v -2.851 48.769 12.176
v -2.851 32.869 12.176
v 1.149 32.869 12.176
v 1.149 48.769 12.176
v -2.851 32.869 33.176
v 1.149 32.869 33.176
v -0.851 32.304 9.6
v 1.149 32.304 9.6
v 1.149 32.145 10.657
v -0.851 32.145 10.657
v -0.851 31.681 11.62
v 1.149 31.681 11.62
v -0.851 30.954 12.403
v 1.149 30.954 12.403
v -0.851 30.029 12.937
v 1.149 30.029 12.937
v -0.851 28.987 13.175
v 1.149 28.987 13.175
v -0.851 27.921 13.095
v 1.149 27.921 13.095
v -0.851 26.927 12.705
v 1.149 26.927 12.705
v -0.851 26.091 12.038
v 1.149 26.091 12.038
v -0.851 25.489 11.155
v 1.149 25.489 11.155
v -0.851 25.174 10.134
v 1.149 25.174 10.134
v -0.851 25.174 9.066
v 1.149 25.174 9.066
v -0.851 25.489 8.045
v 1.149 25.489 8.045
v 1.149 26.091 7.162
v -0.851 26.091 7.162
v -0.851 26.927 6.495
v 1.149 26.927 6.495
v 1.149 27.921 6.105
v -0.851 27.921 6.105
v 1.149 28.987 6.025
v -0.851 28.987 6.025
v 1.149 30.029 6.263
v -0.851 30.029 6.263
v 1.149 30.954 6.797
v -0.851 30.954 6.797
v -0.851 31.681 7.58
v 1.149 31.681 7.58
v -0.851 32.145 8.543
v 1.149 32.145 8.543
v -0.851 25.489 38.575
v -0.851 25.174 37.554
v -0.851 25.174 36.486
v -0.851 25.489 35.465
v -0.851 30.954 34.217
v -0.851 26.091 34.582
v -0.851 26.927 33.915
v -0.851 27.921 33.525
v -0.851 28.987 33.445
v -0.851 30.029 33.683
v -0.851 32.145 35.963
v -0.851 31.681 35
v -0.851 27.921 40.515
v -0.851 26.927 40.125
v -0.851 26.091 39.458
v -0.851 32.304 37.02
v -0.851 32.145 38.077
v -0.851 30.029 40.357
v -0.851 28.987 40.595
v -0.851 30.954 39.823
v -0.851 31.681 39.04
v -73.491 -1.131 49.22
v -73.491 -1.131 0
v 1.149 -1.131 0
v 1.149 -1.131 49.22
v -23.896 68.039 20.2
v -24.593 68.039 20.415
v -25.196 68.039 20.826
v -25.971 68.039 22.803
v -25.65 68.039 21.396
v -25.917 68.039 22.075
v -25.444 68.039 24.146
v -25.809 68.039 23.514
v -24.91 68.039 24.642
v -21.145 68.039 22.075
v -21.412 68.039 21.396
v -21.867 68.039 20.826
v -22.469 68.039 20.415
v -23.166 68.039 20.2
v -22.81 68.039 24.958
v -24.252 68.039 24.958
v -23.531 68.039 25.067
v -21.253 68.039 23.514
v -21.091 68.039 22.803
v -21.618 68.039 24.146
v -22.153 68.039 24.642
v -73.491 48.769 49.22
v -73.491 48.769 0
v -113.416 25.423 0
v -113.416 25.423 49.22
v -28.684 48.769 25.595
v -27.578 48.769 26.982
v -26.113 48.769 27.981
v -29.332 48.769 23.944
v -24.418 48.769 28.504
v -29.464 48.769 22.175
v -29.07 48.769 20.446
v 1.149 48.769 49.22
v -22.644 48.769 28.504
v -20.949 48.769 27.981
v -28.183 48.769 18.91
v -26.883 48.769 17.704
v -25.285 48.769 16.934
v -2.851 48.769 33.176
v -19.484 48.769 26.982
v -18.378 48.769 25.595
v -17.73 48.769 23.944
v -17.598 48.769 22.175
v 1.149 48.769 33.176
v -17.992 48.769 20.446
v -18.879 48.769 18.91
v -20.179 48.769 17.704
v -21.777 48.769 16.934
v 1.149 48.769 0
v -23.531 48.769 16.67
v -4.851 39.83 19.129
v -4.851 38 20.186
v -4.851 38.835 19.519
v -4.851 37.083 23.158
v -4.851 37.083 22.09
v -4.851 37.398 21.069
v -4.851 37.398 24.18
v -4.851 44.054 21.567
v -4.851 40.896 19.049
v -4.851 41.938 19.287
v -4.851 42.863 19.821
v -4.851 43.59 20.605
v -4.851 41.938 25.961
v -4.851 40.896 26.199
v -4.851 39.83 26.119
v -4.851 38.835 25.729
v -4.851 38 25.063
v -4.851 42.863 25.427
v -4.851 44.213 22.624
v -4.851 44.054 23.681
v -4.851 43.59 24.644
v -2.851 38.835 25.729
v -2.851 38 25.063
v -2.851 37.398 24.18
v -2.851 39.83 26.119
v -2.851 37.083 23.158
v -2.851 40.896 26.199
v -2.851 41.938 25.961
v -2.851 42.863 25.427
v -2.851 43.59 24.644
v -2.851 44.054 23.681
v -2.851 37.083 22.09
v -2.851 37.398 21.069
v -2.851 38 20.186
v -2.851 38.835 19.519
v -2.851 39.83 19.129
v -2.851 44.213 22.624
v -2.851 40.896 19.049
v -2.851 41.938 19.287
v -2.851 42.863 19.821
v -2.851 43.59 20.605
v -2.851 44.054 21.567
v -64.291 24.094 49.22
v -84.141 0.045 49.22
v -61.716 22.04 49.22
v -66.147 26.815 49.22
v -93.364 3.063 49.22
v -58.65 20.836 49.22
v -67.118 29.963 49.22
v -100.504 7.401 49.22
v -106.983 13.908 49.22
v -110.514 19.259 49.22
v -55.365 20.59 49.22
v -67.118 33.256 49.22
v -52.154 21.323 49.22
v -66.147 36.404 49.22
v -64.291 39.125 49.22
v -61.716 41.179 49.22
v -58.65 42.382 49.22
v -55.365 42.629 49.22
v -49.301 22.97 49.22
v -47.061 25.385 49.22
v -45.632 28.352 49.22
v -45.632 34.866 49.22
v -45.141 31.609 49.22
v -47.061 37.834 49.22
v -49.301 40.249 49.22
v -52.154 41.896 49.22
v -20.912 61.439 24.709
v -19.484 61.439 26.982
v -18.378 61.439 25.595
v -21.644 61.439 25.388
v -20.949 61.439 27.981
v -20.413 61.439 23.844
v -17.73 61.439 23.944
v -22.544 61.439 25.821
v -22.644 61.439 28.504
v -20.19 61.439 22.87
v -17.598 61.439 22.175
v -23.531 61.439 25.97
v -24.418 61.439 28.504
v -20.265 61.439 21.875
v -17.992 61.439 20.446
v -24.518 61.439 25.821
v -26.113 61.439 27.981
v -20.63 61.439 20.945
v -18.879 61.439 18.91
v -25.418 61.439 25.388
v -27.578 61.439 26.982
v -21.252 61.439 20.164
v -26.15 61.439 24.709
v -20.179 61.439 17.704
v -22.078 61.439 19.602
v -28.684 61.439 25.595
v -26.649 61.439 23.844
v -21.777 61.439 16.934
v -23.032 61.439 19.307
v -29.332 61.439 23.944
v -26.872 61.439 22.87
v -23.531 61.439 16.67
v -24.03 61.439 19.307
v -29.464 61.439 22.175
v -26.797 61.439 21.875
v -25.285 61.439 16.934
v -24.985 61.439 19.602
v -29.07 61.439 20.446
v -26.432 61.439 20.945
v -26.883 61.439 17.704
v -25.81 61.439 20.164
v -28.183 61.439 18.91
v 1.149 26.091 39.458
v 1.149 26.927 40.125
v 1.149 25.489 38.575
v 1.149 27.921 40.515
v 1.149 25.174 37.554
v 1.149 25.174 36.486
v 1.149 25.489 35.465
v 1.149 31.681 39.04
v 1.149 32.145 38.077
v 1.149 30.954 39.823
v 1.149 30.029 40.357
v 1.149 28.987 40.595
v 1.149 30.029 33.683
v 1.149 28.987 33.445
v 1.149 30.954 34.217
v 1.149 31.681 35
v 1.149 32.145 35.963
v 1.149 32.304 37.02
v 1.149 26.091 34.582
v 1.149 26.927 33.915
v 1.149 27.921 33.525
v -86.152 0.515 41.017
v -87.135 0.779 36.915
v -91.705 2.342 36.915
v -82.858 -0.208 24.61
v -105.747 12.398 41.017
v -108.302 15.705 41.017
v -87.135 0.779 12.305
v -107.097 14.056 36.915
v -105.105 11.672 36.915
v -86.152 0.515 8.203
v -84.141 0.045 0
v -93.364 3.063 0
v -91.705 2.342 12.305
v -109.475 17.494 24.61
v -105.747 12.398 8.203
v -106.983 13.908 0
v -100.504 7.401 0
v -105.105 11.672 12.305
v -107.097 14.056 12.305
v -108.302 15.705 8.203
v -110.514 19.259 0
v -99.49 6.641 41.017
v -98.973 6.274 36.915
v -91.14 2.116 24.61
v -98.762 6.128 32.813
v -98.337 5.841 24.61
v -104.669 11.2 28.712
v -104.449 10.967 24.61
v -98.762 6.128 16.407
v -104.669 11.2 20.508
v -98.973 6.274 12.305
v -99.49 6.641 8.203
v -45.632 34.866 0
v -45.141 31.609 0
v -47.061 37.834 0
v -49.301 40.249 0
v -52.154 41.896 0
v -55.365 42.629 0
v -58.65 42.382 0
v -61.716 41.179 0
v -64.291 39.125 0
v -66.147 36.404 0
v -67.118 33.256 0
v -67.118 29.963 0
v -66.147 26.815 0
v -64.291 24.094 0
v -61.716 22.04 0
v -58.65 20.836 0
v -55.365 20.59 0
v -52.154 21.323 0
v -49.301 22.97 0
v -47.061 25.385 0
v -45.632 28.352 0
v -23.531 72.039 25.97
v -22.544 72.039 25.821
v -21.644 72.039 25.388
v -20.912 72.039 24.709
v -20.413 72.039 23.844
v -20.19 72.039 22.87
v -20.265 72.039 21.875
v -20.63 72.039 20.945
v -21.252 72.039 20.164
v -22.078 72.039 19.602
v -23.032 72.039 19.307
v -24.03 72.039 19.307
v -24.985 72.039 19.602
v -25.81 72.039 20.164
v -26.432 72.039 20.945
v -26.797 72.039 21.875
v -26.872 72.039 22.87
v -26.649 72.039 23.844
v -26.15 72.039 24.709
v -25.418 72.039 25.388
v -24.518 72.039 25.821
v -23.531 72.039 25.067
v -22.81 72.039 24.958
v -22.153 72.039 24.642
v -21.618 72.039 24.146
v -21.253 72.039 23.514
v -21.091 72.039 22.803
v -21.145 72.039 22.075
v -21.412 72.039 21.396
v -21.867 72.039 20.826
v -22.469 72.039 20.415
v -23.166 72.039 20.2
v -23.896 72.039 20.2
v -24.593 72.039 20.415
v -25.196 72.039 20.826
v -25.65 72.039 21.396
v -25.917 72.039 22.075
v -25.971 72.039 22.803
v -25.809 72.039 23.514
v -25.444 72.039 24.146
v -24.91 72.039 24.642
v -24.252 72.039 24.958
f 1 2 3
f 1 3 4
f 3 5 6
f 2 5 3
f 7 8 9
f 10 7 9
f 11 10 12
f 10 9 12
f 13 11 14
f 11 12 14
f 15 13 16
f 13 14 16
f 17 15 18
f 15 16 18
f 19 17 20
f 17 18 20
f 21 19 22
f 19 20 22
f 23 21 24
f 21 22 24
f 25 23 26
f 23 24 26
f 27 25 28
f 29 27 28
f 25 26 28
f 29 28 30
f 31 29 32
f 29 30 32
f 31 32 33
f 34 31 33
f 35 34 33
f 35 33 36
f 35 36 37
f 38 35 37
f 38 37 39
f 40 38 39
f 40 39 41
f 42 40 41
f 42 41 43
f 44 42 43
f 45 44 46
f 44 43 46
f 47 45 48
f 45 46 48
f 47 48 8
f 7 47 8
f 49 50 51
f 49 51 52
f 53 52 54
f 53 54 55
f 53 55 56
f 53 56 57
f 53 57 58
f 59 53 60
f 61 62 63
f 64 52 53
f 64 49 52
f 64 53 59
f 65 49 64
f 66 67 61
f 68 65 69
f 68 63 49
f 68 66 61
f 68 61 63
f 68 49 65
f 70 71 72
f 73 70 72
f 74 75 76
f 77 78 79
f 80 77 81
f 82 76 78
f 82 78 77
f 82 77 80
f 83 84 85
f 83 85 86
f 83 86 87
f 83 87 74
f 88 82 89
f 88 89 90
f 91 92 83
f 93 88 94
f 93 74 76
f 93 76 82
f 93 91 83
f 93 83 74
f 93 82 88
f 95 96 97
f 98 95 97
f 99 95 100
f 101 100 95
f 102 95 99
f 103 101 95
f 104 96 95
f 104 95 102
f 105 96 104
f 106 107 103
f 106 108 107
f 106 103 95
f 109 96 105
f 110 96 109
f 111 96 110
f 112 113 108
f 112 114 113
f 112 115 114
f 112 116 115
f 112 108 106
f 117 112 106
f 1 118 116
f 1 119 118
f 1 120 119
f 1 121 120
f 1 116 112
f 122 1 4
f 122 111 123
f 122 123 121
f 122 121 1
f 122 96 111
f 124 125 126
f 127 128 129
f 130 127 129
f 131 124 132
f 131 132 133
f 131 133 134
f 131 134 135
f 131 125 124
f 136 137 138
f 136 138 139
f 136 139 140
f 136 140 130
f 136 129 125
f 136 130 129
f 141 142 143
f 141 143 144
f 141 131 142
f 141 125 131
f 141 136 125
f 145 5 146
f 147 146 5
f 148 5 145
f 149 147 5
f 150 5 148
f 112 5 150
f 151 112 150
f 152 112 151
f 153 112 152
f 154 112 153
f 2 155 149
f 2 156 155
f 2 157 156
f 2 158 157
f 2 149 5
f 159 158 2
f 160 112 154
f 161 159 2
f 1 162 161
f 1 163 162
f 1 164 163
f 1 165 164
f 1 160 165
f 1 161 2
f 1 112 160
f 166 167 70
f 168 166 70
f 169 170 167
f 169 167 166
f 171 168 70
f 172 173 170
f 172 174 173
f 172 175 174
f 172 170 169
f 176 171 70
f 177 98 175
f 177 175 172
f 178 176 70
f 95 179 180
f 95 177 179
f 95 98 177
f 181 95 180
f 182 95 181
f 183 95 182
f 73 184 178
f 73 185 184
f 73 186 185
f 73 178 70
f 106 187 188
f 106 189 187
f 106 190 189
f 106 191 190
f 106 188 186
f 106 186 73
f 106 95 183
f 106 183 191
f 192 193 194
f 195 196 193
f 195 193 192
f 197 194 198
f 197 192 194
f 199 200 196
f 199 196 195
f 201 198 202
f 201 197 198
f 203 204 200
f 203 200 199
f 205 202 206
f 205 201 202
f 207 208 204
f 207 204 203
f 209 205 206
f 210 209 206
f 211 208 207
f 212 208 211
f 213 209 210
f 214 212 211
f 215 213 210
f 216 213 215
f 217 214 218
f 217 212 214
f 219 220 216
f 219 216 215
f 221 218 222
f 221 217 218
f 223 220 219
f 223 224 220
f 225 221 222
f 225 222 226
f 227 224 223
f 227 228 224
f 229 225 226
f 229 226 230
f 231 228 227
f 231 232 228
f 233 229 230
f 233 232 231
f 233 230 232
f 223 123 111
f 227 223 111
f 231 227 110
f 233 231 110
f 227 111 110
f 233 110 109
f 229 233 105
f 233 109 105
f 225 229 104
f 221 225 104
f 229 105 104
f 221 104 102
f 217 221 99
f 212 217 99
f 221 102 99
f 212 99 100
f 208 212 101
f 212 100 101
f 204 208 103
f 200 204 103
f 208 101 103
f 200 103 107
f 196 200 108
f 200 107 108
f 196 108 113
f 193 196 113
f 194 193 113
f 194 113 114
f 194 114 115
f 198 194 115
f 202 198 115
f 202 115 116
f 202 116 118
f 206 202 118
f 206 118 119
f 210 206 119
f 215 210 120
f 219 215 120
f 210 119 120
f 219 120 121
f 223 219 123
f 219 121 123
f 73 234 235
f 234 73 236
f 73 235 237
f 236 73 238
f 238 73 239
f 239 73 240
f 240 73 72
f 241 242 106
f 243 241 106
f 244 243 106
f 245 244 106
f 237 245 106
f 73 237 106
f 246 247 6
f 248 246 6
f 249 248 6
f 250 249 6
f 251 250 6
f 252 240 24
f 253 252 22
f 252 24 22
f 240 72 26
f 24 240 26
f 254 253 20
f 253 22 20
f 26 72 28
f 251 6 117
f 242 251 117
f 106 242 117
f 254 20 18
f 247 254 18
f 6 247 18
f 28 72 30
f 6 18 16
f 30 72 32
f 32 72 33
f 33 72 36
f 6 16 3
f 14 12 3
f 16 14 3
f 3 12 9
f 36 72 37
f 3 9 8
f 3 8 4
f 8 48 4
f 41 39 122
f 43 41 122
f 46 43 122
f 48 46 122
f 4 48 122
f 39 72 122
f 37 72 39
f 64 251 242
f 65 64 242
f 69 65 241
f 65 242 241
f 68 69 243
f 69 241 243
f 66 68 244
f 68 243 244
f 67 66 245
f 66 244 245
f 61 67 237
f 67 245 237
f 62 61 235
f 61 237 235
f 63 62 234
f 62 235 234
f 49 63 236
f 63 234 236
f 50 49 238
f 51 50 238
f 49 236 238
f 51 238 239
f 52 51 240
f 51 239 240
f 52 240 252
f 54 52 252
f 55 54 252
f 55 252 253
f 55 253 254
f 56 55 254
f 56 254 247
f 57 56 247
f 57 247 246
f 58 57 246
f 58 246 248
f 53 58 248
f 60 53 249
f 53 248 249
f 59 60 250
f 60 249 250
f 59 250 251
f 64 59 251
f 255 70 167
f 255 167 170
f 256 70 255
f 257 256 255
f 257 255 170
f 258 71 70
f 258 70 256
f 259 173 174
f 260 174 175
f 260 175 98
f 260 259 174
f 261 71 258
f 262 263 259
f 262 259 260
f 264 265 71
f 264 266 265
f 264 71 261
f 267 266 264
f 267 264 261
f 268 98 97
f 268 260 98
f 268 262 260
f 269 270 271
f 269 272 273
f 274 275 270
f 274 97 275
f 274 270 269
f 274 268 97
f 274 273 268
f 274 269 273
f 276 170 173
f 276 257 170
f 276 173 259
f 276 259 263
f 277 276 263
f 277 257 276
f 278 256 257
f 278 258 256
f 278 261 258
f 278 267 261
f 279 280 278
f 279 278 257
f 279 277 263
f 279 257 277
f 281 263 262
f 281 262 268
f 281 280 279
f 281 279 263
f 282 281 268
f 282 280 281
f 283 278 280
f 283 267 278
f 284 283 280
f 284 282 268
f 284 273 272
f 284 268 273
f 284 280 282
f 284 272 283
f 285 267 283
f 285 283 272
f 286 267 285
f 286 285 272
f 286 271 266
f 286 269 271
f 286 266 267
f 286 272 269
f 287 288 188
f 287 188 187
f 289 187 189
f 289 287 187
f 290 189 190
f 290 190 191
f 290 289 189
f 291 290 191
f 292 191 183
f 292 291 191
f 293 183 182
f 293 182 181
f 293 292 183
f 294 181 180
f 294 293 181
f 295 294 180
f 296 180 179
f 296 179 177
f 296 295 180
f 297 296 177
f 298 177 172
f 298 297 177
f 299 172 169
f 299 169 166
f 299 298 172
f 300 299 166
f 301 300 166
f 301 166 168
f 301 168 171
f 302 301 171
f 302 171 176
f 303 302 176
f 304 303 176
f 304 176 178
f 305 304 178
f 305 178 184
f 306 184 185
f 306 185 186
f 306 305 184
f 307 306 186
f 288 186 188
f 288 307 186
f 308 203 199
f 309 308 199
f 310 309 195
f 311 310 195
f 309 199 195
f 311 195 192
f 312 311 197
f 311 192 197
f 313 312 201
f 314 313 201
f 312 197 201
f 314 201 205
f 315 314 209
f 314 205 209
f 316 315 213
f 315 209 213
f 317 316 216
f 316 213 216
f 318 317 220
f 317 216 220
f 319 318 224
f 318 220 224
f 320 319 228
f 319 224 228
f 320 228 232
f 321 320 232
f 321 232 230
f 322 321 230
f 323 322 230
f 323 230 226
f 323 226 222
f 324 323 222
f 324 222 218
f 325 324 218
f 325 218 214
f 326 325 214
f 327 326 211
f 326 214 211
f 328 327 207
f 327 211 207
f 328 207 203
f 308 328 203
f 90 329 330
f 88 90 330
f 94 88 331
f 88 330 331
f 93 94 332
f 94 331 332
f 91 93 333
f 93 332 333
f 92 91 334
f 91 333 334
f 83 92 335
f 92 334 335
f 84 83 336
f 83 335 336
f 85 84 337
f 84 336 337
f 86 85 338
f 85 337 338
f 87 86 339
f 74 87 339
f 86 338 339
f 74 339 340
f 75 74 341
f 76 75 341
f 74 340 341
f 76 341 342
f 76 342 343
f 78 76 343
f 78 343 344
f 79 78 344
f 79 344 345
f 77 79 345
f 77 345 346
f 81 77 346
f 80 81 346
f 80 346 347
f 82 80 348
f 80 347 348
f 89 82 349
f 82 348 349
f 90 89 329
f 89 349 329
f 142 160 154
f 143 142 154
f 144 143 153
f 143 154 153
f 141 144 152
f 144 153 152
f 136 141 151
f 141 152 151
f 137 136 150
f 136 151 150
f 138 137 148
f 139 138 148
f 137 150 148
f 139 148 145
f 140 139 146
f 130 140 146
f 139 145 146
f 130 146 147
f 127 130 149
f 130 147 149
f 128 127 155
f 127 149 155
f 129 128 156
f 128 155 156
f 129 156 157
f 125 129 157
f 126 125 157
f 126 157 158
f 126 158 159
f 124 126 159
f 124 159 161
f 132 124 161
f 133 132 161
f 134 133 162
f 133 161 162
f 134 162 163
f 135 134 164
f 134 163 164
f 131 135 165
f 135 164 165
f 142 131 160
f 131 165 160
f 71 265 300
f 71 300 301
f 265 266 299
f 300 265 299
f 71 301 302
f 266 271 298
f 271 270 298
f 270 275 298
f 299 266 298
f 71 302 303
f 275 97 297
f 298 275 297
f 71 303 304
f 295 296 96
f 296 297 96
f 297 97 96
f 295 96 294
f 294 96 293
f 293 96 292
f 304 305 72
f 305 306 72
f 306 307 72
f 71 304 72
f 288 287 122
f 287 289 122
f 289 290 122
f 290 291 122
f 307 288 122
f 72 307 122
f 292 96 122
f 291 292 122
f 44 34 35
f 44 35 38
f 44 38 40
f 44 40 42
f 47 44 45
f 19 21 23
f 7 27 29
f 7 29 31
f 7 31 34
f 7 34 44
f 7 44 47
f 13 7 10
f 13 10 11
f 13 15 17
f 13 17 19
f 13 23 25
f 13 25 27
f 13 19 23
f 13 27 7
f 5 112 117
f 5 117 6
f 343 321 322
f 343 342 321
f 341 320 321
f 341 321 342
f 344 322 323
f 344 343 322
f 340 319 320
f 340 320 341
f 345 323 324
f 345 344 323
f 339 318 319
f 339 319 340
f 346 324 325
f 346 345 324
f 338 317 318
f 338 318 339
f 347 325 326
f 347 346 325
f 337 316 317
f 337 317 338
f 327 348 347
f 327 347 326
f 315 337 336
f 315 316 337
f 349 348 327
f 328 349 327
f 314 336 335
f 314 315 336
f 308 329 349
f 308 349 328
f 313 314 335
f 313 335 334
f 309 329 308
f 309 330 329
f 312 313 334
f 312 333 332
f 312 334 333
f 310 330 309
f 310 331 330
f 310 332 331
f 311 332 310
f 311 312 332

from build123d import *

# Parameters (mm, degrees)
SKETCH2_W               = 74.64
SKETCH2_H               = 49.9
SKETCH2_R               = 11.05
BOSS_EXTRUDE3_DEPTH     = 49.22
BOSS_EXTRUDE4_DEPTH     = 49.22
SKETCH7_R               = 5.95
BOSS_EXTRUDE5_DEPTH     = 12.67
SKETCH8_R               = 3.35
BOSS_EXTRUDE6_DEPTH     = 10.6
SKETCH9_R               = 2.447157839
CUT_EXTRUDE1_DEPTH      = 4
CUT_EXTRUDE2_DEPTH      = 145.004745584
CUT_EXTRUDE2_DEPTH_BACK = 4
SKETCH11_R              = 3.585
CUT_EXTRUDE3_DEPTH      = 2
SKETCH12_R              = 3.585
CUT_EXTRUDE4_DEPTH      = 2
SKETCH13_R              = 3.585
CUT_EXTRUDE5_DEPTH      = 2


with BuildPart() as part:
    # Sketch2 → Boss-Extrude3 (new body)
    with BuildSketch(Plane.XY):
        with Locations((-36.171052169, 23.819106833)):
            Rectangle(SKETCH2_W, SKETCH2_H)
        with Locations((-56.191052169, 31.609453319)):
            Circle(SKETCH2_R, mode=Mode.SUBTRACT)
    extrude(amount=BOSS_EXTRUDE3_DEPTH)

    # Sketch3 → Boss-Extrude4 (add)
    with BuildSketch(Plane.XY):
        with BuildLine():
            Line((-73.491052169, 48.769106833), (-113.415991852, 25.422550529))
            add(Edge.make_bspline(
                [(-73.491052169, -1.130893167), (-103.22071341, -0.46361186), (-113.415991852, 25.422550529)],
                knots=[0, 0, 0, 1, 1, 1], degree=2))
            Line((-73.491052169, -1.130893167), (-73.491052169, 48.769106833))
        make_face()
    extrude(amount=BOSS_EXTRUDE4_DEPTH)

    # Sketch7 → Boss-Extrude5 (add)
    with BuildSketch(Plane(origin=(0, 48.769106833, 0), x_dir=(1, 0, 0), z_dir=(0, 1, 0))):
        with Locations(Location((-23.531052169, -22.62, 0), (0, 0, 90))):
            Circle(SKETCH7_R)
    extrude(amount=BOSS_EXTRUDE5_DEPTH)

    # Sketch8 → Boss-Extrude6 (add)
    with BuildSketch(Plane(origin=(0, 61.439106833, 0), x_dir=(1, 0, 0), z_dir=(0, 1, 0))):
        with Locations(Location((-23.531052169, -22.62, 0), (0, 0, 270))):
            Circle(SKETCH8_R)
    extrude(amount=BOSS_EXTRUDE6_DEPTH)

    # Sketch9 → Cut-Extrude1 (cut)
    with BuildSketch(Plane(origin=(0, 72.039106833, 0), x_dir=(1, 0, 0), z_dir=(0, 1, 0))):
        with Locations(Location((-23.531052169, -22.62, 0), (0, 0, 270))):
            Circle(SKETCH9_R)
    extrude(amount=-CUT_EXTRUDE1_DEPTH, mode=Mode.SUBTRACT)

    # Sketch10 → Cut-Extrude2 (cut, two sides: drawn at the far end of the back side and taken through both)
    with BuildSketch(Plane(origin=(1.148947831, 0, 0), x_dir=(0, 0, -1), z_dir=(1, 0, 0)).offset(-CUT_EXTRUDE2_DEPTH_BACK)):
        Polygon((-33.176264777, 183.063086359), (-33.176264777, 48.769106833), (-33.176264777, 32.869106833), (-12.176264777, 32.869106833), (-12.176264777, 48.769106833), (-12.176264777, 183.063086359), (-12.176264777, 451.651045412), (-33.176264777, 451.651045412), align=None)
    extrude(amount=CUT_EXTRUDE2_DEPTH + CUT_EXTRUDE2_DEPTH_BACK, mode=Mode.SUBTRACT)

    # Sketch11 → Cut-Extrude3 (cut)
    with BuildSketch(Plane(origin=(-2.851052169, 0, 0), x_dir=(0, 0, -1), z_dir=(1, 0, 0))):
        with Locations(Location((-22.624143427, 40.627842238, 0), (0, 0, 90))):
            Circle(SKETCH11_R)
    extrude(amount=-CUT_EXTRUDE3_DEPTH, mode=Mode.SUBTRACT)

    # Sketch12 → Cut-Extrude4 (cut)
    with BuildSketch(Plane(origin=(1.148947831, 0, 0), x_dir=(0, 0, -1), z_dir=(1, 0, 0))):
        with Locations(Location((-9.6, 28.719106833, 0), (0, 0, 90))):
            Circle(SKETCH12_R)
    extrude(amount=-CUT_EXTRUDE4_DEPTH, mode=Mode.SUBTRACT)

    # Sketch13 → Cut-Extrude5 (cut)
    with BuildSketch(Plane(origin=(1.148947831, 0, 0), x_dir=(0, 0, -1), z_dir=(1, 0, 0))):
        with Locations(Location((-37.02, 28.719106833, 0), (0, 0, 90))):
            Circle(SKETCH13_R)
    extrude(amount=-CUT_EXTRUDE5_DEPTH, mode=Mode.SUBTRACT)


solid = part.part
